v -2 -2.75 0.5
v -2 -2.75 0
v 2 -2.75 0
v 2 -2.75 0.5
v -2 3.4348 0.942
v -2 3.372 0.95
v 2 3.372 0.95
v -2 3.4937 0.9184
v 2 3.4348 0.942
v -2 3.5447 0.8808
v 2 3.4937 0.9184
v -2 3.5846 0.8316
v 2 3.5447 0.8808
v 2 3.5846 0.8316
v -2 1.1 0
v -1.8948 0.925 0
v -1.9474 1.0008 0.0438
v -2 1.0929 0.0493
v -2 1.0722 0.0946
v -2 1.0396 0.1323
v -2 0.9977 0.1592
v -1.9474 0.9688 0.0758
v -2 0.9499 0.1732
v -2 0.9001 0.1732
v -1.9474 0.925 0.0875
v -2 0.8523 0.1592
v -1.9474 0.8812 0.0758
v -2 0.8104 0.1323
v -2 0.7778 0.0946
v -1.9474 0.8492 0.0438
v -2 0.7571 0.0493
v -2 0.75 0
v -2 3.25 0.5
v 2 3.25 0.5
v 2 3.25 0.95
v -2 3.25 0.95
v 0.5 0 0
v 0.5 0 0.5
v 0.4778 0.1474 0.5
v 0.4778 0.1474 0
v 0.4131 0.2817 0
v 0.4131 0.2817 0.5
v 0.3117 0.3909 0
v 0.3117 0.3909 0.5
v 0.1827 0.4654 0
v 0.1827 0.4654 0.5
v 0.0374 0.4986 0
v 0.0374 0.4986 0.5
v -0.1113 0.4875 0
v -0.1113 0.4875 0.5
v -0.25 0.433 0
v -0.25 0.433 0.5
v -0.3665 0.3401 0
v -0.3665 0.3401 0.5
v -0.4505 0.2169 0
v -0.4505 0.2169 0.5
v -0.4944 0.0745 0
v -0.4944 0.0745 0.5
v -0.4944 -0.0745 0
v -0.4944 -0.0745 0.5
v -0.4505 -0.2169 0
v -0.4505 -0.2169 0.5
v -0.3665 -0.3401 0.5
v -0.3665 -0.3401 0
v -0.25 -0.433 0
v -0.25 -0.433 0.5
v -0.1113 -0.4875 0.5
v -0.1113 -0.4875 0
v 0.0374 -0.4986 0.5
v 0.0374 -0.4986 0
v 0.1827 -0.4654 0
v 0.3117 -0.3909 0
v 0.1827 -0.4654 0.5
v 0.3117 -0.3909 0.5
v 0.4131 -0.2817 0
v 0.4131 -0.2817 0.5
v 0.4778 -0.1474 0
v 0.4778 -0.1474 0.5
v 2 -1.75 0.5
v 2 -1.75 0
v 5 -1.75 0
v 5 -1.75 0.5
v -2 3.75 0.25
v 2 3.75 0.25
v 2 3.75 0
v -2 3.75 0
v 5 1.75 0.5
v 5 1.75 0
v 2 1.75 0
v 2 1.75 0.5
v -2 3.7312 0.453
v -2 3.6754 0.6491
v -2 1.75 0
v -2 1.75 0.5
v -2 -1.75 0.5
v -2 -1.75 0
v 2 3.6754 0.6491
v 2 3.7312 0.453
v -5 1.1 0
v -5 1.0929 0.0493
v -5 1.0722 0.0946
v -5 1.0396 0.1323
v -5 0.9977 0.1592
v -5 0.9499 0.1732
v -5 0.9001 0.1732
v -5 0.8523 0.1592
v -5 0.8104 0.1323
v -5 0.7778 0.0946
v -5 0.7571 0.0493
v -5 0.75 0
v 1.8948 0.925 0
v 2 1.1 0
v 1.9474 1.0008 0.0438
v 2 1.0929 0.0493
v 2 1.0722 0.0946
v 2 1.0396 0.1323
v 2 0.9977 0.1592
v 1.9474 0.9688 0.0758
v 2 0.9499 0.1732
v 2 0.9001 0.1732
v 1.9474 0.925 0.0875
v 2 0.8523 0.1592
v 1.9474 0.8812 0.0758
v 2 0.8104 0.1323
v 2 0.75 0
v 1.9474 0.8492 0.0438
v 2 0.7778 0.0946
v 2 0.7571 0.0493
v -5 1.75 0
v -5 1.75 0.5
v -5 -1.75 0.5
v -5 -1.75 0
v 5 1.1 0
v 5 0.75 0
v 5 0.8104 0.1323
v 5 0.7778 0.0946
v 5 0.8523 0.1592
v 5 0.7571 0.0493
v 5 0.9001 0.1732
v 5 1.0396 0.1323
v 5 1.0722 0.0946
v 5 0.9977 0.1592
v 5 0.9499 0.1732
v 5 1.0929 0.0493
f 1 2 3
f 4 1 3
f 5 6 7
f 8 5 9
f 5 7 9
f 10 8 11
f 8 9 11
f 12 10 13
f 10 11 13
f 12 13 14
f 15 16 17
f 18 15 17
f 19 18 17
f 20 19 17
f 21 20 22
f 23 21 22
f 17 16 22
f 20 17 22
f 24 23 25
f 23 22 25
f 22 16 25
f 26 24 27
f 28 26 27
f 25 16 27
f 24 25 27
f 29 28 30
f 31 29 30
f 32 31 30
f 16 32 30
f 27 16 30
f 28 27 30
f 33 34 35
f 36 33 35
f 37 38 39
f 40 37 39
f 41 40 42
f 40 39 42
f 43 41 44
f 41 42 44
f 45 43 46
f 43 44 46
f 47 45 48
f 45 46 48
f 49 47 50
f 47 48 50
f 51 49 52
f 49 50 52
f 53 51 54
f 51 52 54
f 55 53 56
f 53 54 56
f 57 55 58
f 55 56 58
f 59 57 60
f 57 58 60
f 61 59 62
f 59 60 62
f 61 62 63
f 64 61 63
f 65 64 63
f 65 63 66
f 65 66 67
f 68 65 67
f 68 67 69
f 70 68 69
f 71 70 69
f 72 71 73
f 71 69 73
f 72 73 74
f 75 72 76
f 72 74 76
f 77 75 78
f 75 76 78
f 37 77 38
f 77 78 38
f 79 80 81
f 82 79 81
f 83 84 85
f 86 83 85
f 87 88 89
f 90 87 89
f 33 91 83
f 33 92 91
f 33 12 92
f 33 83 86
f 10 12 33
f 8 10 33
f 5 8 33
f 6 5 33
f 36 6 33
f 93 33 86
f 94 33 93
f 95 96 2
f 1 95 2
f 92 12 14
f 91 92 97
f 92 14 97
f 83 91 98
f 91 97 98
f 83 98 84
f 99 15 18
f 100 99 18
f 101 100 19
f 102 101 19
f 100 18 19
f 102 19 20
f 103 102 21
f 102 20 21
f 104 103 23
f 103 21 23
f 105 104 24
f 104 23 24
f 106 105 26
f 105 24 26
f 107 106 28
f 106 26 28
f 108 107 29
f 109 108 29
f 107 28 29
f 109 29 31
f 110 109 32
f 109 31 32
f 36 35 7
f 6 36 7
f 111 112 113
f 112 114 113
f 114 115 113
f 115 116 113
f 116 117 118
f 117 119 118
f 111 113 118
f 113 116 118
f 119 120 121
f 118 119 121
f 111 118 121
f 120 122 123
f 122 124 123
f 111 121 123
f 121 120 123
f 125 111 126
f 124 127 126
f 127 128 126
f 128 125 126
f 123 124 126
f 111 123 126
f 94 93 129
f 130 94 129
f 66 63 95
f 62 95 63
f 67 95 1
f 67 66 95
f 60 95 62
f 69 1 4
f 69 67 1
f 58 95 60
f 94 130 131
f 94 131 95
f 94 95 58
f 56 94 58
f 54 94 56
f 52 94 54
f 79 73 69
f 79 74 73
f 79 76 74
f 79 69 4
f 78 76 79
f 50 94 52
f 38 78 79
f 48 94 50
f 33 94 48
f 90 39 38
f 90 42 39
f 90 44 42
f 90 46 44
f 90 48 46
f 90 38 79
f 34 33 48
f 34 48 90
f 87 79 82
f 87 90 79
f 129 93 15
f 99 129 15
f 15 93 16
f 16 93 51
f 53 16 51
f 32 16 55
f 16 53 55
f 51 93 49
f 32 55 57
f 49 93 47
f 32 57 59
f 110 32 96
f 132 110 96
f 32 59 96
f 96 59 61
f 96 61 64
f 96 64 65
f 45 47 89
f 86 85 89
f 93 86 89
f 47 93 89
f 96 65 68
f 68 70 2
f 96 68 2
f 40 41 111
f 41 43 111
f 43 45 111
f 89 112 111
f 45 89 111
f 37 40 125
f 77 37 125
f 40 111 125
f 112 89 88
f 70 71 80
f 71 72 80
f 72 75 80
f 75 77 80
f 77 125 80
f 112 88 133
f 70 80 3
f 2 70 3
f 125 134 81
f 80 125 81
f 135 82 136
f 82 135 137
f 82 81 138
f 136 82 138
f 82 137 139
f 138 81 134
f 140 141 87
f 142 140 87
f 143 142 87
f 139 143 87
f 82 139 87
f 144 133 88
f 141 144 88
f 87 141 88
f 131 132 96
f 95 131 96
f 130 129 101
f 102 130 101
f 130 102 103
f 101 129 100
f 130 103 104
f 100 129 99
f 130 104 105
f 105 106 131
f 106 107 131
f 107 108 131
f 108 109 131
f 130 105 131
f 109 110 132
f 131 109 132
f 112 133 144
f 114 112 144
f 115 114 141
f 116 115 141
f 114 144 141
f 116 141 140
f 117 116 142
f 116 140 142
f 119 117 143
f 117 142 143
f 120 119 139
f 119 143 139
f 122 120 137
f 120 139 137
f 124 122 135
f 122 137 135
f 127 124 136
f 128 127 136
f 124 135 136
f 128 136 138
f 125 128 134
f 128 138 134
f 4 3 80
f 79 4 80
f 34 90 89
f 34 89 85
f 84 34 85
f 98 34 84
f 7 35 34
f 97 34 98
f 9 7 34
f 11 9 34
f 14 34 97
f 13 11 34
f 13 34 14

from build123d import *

# Parameters (mm, degrees)
SALIENTE_EXTRUIR1_DEPTH             = 0.5
CROQUIS2_R                          = 0.5
CORTAR_EXTRUIR1_DEPTH               = 0.5
SALIENTE_EXTRUIR2_REACH             = 7.984
SALIENTE_EXTRUIR2_DIRECTION_2_REACH = 7.984


# Read off the part's stored shape, not the designer's step: Diámetro de taladro Ø0.35 (0.35)1
with BuildPart() as part:
    # Croquis1 → Saliente-Extruir1 (new body)
    with BuildSketch(Plane.XY):
        Polygon((-5, 1.75), (-5, -1.75), (-2, -1.75), (-2, -2.75), (2, -2.75), (2, -1.75), (5, -1.75), (5, 1.75), (2, 1.75), (2, 3.25), (-2, 3.25), (-2, 1.75), align=None)
    extrude(amount=SALIENTE_EXTRUIR1_DEPTH)

    # Croquis2 → Cortar-Extruir1 (cut)
    with BuildSketch(Plane.XY.offset(0.5)):
        Circle(CROQUIS2_R)
    extrude(amount=-CORTAR_EXTRUIR1_DEPTH, mode=Mode.SUBTRACT)

    # Saliente-Extruir2: up to this face of the body (flat: up to its plane)
    saliente_extruir2_end = Plane(part.part.faces().sort_by_distance((2, 2.5, 0.25))[0])
    # Croquis3 → Saliente-Extruir2 (add, up to the picked face)
    with BuildSketch(Plane(origin=(0, 0, 0), x_dir=(0, 0, -1), z_dir=(1, 0, 0)), mode=Mode.PRIVATE) as saliente_extruir2_sk1:
        with BuildLine():
            Line((-0.95, 3.25), (-0.95, 3.371997249))
            ThreePointArc((-0.95, 3.371997249), (-0.918397272, 3.493663315), (-0.831578947, 3.584569544))
            ThreePointArc((-0.831578947, 3.584569544), (-0.55232487, 3.707838028), (-0.25, 3.75))
            Line((-0.25, 3.75), (0, 3.75))
            Line((0, 3.75), (0, 3.25))
            Line((0, 3.25), (-0.95, 3.25))
        make_face()
    saliente_extruir2_tool1 = split(extrude(saliente_extruir2_sk1.sketch, amount=SALIENTE_EXTRUIR2_REACH, mode=Mode.PRIVATE), bisect_by=saliente_extruir2_end, keep=Keep.BOTH, mode=Mode.PRIVATE)
    add(saliente_extruir2_tool1.solids().sort_by(Axis((0, 3.476563, 0.431746), (1, 0, 0)))[0])

    # Saliente-Extruir2 direction 2: up to this face of the body (flat: up to its plane)
    saliente_extruir2_direction_2_end = Plane(part.part.faces().sort_by_distance((-2, 2.5, 0.25))[0])
    # Croquis3 → Saliente-Extruir2 direction 2 (add, up to the picked face)
    with BuildSketch(Plane(origin=(0, 0, 0), x_dir=(0, 0, -1), z_dir=(1, 0, 0)), mode=Mode.PRIVATE) as saliente_extruir2_direction_2_sk1:
        with BuildLine():
            Line((-0.95, 3.25), (-0.95, 3.371997249))
            ThreePointArc((-0.95, 3.371997249), (-0.918397272, 3.493663315), (-0.831578947, 3.584569544))
            ThreePointArc((-0.831578947, 3.584569544), (-0.55232487, 3.707838028), (-0.25, 3.75))
            Line((-0.25, 3.75), (0, 3.75))
            Line((0, 3.75), (0, 3.25))
            Line((0, 3.25), (-0.95, 3.25))
        make_face()
    saliente_extruir2_direction_2_tool1 = split(extrude(saliente_extruir2_direction_2_sk1.sketch, amount=-SALIENTE_EXTRUIR2_DIRECTION_2_REACH, mode=Mode.PRIVATE), bisect_by=saliente_extruir2_direction_2_end, keep=Keep.BOTH, mode=Mode.PRIVATE)
    add(saliente_extruir2_direction_2_tool1.solids().sort_by(Axis((0, 3.476563, 0.431746), (-1, 0, 0)))[0])

    # Diámetro de taladro Ø0.35 (0.35)1 outlin → Diámetro de taladro Ø0.35 (0.35)1 (revolve, cut)
    with BuildSketch(Plane(origin=(0, 0.925, 0), x_dir=(0, 1, 0), z_dir=(0, 0, -1))):
        Polygon((0.175, -5), (0.175, -2), (0, -1.894849392), (0, -5), align=None)
        Polygon((0, 5), (0, 1.894849392), (0.175, 2), (0.175, 5), align=None)
    revolve(axis=Axis((0, 0.925, 0), (1, 0, 0)), mode=Mode.SUBTRACT)


solid = part.part
